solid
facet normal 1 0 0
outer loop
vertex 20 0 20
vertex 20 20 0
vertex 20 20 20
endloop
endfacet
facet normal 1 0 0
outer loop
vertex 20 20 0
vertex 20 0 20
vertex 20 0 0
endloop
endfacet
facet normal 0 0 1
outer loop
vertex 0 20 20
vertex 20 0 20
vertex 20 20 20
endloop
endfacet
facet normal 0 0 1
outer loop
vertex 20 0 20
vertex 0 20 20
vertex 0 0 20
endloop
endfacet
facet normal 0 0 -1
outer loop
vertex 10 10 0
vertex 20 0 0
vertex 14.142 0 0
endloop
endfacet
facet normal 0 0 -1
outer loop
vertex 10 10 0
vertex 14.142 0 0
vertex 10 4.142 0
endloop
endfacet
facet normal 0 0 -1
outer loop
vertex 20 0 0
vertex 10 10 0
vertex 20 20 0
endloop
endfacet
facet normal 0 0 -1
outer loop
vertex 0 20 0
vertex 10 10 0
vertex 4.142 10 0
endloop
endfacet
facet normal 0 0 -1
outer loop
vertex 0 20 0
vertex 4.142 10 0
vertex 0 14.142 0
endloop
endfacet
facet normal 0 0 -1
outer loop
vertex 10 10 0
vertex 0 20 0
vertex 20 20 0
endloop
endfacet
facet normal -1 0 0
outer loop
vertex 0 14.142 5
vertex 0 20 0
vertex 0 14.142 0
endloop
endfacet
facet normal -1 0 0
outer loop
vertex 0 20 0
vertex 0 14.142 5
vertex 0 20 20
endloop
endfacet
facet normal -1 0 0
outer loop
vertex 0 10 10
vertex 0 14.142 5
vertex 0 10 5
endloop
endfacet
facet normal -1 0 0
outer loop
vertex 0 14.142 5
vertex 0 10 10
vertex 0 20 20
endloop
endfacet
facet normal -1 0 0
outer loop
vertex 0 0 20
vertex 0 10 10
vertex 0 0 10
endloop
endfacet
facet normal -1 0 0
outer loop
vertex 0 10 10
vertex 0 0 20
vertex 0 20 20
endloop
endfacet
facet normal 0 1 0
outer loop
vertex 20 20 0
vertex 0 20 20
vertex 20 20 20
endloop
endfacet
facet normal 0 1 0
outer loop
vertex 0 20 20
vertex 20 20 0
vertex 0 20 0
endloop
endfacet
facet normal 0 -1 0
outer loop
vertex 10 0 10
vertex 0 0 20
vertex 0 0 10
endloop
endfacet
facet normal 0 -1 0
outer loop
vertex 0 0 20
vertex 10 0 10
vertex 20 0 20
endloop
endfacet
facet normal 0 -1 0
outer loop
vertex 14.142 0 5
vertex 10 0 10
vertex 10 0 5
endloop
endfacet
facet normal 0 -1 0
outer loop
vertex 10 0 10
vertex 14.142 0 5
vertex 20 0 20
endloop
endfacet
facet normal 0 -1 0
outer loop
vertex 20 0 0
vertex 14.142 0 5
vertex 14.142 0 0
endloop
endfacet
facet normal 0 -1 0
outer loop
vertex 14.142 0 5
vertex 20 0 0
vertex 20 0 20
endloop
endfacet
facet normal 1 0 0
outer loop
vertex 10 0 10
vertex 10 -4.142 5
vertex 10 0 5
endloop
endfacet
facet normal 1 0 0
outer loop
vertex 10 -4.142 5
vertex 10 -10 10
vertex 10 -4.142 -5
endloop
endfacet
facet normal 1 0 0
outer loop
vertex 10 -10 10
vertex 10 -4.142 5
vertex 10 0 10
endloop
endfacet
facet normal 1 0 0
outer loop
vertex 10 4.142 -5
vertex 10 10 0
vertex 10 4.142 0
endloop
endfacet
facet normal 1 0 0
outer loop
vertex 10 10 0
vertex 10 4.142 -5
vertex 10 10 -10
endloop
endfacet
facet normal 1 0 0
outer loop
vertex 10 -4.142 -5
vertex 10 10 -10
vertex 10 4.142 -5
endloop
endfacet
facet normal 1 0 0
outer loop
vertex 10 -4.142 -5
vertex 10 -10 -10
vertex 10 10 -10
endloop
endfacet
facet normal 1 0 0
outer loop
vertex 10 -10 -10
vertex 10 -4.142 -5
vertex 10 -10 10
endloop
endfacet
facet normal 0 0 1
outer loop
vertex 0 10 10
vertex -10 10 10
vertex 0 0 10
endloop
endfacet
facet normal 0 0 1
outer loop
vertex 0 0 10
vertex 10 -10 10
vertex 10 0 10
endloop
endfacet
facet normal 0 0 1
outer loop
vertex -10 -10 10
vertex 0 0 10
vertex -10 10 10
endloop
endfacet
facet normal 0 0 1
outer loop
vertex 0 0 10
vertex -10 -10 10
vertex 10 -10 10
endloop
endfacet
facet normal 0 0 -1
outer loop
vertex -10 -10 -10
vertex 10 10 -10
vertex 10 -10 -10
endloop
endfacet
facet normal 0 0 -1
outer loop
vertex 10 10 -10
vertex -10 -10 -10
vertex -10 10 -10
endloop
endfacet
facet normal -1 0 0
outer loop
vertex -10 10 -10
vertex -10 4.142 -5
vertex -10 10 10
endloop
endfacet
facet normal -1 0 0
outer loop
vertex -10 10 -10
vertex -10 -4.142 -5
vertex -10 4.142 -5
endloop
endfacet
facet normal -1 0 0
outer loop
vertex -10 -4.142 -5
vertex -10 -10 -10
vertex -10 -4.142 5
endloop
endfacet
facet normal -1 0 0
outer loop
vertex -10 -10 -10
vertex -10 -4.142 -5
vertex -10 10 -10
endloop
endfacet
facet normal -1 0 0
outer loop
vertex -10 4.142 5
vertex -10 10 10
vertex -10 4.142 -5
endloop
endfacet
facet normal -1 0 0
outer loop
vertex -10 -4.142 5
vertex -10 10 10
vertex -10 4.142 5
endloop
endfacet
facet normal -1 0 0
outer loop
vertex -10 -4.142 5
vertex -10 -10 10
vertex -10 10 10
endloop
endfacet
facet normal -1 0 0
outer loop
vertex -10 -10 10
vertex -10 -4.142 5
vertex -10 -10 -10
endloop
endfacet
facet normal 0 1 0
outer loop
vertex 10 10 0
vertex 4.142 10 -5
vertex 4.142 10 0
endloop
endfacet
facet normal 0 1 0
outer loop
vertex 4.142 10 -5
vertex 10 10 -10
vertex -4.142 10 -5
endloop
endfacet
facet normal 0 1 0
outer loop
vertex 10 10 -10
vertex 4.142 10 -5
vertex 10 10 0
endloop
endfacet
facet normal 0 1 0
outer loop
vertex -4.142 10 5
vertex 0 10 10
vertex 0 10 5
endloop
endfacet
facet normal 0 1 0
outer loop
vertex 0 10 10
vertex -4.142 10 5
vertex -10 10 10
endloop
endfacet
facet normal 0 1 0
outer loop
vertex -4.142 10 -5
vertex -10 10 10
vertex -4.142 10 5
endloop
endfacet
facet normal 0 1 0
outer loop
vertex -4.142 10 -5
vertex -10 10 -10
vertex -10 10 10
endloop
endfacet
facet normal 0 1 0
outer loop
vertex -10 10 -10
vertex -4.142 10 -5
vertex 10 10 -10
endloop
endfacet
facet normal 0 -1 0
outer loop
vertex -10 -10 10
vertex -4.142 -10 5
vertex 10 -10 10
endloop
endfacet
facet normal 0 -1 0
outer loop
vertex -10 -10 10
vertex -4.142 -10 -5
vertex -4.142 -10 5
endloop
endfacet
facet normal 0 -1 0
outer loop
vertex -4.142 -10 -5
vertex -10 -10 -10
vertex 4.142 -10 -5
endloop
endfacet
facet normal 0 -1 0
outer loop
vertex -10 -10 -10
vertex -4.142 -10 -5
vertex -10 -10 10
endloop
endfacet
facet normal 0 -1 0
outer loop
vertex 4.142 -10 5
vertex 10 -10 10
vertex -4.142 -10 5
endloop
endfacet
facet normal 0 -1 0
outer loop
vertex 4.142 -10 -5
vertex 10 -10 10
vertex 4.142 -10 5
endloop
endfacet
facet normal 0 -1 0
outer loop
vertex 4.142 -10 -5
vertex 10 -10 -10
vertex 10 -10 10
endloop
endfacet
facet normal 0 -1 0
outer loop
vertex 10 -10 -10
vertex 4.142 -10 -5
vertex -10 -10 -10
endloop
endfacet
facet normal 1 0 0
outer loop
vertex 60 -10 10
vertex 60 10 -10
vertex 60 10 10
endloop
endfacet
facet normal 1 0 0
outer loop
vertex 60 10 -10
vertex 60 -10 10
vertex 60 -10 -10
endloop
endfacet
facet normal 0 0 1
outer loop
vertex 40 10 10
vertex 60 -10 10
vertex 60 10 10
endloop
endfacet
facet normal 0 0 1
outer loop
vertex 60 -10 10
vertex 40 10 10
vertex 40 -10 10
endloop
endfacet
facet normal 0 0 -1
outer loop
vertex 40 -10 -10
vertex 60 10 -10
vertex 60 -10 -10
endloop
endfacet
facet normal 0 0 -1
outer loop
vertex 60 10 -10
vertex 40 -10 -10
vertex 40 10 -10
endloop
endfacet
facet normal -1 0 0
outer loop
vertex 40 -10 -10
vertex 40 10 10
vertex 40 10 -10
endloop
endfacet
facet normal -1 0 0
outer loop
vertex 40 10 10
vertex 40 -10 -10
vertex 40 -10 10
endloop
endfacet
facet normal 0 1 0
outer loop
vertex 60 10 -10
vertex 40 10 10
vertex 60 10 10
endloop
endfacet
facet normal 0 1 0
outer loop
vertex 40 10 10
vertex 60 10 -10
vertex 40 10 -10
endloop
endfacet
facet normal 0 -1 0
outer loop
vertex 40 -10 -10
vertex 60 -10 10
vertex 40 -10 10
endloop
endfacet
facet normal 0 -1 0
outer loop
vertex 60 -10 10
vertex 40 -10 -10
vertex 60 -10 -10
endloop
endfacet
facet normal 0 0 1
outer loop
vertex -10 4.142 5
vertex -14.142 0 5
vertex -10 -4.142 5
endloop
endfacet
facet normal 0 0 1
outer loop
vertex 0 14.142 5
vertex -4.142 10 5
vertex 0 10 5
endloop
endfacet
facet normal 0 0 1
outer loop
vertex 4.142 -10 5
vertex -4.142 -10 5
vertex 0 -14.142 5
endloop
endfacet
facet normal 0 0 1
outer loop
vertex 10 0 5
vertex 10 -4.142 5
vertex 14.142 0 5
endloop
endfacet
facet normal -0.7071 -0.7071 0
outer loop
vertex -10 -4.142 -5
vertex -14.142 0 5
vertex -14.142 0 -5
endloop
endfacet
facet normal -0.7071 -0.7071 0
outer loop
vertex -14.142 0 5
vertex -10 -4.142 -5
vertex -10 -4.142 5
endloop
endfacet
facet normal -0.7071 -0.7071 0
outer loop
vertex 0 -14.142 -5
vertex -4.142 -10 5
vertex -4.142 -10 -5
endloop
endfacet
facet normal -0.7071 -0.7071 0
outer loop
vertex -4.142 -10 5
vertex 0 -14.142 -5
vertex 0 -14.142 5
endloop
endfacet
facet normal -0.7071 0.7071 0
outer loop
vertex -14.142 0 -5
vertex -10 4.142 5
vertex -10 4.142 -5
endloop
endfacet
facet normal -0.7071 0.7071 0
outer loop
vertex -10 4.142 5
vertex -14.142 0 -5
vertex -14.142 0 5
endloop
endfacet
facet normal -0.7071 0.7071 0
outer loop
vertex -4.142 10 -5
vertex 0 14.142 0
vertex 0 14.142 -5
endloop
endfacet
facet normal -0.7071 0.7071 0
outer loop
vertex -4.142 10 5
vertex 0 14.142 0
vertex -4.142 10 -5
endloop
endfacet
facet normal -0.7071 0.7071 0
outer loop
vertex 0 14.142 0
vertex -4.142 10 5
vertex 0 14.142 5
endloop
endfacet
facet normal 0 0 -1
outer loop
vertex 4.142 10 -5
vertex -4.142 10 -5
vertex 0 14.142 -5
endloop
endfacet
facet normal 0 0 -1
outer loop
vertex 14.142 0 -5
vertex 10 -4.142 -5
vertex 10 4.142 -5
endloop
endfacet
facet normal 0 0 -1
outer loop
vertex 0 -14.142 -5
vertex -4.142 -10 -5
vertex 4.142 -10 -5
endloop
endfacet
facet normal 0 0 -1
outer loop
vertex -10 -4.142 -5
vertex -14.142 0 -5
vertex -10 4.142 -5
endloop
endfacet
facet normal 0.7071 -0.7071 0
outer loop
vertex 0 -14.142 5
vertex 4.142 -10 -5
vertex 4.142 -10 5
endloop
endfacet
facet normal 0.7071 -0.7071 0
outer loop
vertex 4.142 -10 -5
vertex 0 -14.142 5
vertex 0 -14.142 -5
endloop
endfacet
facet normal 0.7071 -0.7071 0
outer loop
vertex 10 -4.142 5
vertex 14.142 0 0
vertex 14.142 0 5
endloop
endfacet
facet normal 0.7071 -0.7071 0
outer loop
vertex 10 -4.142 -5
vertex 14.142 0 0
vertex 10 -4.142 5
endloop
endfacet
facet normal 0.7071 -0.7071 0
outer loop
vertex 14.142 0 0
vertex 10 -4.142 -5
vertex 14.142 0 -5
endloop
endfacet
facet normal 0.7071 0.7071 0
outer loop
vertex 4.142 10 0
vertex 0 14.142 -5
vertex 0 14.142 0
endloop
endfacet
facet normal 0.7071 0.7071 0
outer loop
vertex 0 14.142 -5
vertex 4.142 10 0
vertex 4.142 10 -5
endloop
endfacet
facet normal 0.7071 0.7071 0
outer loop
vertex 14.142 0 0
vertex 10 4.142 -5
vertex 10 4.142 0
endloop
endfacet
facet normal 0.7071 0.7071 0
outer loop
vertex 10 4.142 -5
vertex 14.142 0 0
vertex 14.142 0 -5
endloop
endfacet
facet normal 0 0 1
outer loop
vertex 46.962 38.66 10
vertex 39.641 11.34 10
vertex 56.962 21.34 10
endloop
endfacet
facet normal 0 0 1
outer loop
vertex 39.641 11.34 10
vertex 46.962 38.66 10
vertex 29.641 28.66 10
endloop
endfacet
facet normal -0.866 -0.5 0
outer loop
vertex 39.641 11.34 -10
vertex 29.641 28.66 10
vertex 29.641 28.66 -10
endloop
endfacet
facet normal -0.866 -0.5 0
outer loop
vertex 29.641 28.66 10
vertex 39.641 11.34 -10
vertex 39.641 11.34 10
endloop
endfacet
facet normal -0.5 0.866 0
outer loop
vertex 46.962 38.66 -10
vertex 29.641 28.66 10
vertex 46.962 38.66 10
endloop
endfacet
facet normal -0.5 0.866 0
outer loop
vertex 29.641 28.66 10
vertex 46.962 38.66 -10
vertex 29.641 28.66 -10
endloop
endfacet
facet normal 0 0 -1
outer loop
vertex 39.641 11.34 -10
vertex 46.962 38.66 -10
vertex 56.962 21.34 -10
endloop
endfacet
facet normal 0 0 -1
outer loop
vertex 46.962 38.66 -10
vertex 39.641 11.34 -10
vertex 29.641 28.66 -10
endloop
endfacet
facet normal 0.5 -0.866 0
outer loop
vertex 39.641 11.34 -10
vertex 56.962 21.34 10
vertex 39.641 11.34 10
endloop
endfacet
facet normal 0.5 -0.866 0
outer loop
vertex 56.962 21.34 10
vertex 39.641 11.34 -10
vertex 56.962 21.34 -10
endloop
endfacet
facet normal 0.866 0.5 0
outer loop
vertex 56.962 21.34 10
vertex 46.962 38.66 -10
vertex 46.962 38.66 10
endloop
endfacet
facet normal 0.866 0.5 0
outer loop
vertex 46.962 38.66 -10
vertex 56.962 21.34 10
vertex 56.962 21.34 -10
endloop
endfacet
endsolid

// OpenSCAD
//02 Déplacer et tourner

// =========================================
// D'après le micro-tutoriel vidéo https://www.youtube.com/watch?v=QMsTnDUkJ1E par Juan Gonzalez Gomez.
//==========================================

//Dans ce tuto nous allons voir comment déplacer et tourner les éléments. 

// Commençons par ce que nous connaissons déjà (cf. Tuto 01): créons un cube. Par exemple, créons un cube dont toutes les arêtes sont de longueur 20mm.

cube([20,20,20]);

// Après avoir écrit l'instruction, appuyez sur F5 ou bien cliquez sur l'option "Compile" du menu "Design" de OpenSCAD. Vous avez maintenant votre cube qui s'affiche. 
// D'abord nous allons faire en sorte que le cube soit centré dans l'origine. Pour cela, remarquez que la commande cube accepte un paramètre qui s'appelle "center" qui par défaut n'est pas vrai (on dit que sa valeur par défaut est "false"). Passez ce paramètre à "true", comme suit :

cube( [ 20, 20, 20], center = true);

// Après avoir appuyé sur la touche F5 ou bien avoir cliqué sur l'option "Compile" du menu "Design" d'OpenSCAD, vous pouvez voir qu'un cube apparaît maintenant centré dans l'origine. 

// Bien, nous allons maintenant déplacer le cube de  cinq centimètres le long de l'axe X. Pour cela, utilisez la commande translate juste l'instruction qui nous avez servi toute à l'heure à créer le cube centré à l'origine:

translate([50,0,0])
  cube( [ 20, 20, 20], center = true);

// Notez bien qu'on qu'on a écris 50 car l'unité de mesure d'OpenSCAD sont les millimètres et chaque centimètre équivaut à 10 milimètres. 

// Après avoir appuyé sur la touche F5 vous pouvez voir que votre nouveau cube apparaît déplacé le long de l'axe X. 

// La commande translate applique un déplacement à la figure qui est déclarée juste après, ici le cube. C'est pour ça que certaines personnes aiment bien indenter la ligne avec le code de la figure, pour rendre visible dans la lecture du code sur qui agit la commande translate. Indenter veut dire tout simplement rajouter des espaces au début de la ligne de code. 

// Voyons maintenant comment marchent les rotations, c'est très similaire à ce qu'on a vu pour la translation.

// Nous partirons maintenant d'une pièce différente de celle de toute à l'heure. 

cube([ 20, 20, 10], center = true);

// En fait ce ne sera plus un cube dans le sens du vocabulaire mathématique puisque toutes ses arêtes n'ont pas la même longueur. Le mot mathématiquement correct ici est "pavé droit", mais la commande d'OpenSCAD permettant de le construire c'est toujours cube. 

// Comme toute à l'heure, le paramètre center=true, nous permet de centrer le pavé à l'origine. 

// Pour tourner notre pièce nous utiliserons la commande rotate. Par exemple, pour tourner de 45° autour de l'axe Z on va faire 

rotate([0,0,45])
  cube([ 20, 20, 10], center = true);

// Dans OpenSCAD les angles sont toujours donnés en degrés. Après avoir appuyé sur F5, vous pouvez voir que le pavé à été tourné. 

// Faisons tourner maintenant le cube que nous avions déplacé toute à l'heure. Pour cela rajoutons une instruction avec rotate au début. Par exemple, pour tourner de 30° autour de l'axe Z, écrivez :

rotate([0,0,30])
  translate([50,0,0])
    cube([20,20,20],center=true);

// Remarquez bien que ce rotate s'applique au cube que nous avions déjà, c'est à dire que le cube centré à l'origine est d'abord deplacé le long de l'axe X et seulement en suite il est tourné autour de l'axe Z.

// Pour finir ce tutoriel, ajoutez des commentaire à votre fichier pour le documenter. En règle générale, c'est bien de documenter les codes qu'on réalise.

//-- Exemple de translation et rotation

//-- Translation et rotation d'un cube
rotate([ 0, 0, 30])
  translate([ 50, 0, 0])
    cube([ 20, 20, 20], center=true);

//-- Rotation d'un pavé
rotate([ 0, 0, 45])
  cube([ 20, 20, 10], center = true);
